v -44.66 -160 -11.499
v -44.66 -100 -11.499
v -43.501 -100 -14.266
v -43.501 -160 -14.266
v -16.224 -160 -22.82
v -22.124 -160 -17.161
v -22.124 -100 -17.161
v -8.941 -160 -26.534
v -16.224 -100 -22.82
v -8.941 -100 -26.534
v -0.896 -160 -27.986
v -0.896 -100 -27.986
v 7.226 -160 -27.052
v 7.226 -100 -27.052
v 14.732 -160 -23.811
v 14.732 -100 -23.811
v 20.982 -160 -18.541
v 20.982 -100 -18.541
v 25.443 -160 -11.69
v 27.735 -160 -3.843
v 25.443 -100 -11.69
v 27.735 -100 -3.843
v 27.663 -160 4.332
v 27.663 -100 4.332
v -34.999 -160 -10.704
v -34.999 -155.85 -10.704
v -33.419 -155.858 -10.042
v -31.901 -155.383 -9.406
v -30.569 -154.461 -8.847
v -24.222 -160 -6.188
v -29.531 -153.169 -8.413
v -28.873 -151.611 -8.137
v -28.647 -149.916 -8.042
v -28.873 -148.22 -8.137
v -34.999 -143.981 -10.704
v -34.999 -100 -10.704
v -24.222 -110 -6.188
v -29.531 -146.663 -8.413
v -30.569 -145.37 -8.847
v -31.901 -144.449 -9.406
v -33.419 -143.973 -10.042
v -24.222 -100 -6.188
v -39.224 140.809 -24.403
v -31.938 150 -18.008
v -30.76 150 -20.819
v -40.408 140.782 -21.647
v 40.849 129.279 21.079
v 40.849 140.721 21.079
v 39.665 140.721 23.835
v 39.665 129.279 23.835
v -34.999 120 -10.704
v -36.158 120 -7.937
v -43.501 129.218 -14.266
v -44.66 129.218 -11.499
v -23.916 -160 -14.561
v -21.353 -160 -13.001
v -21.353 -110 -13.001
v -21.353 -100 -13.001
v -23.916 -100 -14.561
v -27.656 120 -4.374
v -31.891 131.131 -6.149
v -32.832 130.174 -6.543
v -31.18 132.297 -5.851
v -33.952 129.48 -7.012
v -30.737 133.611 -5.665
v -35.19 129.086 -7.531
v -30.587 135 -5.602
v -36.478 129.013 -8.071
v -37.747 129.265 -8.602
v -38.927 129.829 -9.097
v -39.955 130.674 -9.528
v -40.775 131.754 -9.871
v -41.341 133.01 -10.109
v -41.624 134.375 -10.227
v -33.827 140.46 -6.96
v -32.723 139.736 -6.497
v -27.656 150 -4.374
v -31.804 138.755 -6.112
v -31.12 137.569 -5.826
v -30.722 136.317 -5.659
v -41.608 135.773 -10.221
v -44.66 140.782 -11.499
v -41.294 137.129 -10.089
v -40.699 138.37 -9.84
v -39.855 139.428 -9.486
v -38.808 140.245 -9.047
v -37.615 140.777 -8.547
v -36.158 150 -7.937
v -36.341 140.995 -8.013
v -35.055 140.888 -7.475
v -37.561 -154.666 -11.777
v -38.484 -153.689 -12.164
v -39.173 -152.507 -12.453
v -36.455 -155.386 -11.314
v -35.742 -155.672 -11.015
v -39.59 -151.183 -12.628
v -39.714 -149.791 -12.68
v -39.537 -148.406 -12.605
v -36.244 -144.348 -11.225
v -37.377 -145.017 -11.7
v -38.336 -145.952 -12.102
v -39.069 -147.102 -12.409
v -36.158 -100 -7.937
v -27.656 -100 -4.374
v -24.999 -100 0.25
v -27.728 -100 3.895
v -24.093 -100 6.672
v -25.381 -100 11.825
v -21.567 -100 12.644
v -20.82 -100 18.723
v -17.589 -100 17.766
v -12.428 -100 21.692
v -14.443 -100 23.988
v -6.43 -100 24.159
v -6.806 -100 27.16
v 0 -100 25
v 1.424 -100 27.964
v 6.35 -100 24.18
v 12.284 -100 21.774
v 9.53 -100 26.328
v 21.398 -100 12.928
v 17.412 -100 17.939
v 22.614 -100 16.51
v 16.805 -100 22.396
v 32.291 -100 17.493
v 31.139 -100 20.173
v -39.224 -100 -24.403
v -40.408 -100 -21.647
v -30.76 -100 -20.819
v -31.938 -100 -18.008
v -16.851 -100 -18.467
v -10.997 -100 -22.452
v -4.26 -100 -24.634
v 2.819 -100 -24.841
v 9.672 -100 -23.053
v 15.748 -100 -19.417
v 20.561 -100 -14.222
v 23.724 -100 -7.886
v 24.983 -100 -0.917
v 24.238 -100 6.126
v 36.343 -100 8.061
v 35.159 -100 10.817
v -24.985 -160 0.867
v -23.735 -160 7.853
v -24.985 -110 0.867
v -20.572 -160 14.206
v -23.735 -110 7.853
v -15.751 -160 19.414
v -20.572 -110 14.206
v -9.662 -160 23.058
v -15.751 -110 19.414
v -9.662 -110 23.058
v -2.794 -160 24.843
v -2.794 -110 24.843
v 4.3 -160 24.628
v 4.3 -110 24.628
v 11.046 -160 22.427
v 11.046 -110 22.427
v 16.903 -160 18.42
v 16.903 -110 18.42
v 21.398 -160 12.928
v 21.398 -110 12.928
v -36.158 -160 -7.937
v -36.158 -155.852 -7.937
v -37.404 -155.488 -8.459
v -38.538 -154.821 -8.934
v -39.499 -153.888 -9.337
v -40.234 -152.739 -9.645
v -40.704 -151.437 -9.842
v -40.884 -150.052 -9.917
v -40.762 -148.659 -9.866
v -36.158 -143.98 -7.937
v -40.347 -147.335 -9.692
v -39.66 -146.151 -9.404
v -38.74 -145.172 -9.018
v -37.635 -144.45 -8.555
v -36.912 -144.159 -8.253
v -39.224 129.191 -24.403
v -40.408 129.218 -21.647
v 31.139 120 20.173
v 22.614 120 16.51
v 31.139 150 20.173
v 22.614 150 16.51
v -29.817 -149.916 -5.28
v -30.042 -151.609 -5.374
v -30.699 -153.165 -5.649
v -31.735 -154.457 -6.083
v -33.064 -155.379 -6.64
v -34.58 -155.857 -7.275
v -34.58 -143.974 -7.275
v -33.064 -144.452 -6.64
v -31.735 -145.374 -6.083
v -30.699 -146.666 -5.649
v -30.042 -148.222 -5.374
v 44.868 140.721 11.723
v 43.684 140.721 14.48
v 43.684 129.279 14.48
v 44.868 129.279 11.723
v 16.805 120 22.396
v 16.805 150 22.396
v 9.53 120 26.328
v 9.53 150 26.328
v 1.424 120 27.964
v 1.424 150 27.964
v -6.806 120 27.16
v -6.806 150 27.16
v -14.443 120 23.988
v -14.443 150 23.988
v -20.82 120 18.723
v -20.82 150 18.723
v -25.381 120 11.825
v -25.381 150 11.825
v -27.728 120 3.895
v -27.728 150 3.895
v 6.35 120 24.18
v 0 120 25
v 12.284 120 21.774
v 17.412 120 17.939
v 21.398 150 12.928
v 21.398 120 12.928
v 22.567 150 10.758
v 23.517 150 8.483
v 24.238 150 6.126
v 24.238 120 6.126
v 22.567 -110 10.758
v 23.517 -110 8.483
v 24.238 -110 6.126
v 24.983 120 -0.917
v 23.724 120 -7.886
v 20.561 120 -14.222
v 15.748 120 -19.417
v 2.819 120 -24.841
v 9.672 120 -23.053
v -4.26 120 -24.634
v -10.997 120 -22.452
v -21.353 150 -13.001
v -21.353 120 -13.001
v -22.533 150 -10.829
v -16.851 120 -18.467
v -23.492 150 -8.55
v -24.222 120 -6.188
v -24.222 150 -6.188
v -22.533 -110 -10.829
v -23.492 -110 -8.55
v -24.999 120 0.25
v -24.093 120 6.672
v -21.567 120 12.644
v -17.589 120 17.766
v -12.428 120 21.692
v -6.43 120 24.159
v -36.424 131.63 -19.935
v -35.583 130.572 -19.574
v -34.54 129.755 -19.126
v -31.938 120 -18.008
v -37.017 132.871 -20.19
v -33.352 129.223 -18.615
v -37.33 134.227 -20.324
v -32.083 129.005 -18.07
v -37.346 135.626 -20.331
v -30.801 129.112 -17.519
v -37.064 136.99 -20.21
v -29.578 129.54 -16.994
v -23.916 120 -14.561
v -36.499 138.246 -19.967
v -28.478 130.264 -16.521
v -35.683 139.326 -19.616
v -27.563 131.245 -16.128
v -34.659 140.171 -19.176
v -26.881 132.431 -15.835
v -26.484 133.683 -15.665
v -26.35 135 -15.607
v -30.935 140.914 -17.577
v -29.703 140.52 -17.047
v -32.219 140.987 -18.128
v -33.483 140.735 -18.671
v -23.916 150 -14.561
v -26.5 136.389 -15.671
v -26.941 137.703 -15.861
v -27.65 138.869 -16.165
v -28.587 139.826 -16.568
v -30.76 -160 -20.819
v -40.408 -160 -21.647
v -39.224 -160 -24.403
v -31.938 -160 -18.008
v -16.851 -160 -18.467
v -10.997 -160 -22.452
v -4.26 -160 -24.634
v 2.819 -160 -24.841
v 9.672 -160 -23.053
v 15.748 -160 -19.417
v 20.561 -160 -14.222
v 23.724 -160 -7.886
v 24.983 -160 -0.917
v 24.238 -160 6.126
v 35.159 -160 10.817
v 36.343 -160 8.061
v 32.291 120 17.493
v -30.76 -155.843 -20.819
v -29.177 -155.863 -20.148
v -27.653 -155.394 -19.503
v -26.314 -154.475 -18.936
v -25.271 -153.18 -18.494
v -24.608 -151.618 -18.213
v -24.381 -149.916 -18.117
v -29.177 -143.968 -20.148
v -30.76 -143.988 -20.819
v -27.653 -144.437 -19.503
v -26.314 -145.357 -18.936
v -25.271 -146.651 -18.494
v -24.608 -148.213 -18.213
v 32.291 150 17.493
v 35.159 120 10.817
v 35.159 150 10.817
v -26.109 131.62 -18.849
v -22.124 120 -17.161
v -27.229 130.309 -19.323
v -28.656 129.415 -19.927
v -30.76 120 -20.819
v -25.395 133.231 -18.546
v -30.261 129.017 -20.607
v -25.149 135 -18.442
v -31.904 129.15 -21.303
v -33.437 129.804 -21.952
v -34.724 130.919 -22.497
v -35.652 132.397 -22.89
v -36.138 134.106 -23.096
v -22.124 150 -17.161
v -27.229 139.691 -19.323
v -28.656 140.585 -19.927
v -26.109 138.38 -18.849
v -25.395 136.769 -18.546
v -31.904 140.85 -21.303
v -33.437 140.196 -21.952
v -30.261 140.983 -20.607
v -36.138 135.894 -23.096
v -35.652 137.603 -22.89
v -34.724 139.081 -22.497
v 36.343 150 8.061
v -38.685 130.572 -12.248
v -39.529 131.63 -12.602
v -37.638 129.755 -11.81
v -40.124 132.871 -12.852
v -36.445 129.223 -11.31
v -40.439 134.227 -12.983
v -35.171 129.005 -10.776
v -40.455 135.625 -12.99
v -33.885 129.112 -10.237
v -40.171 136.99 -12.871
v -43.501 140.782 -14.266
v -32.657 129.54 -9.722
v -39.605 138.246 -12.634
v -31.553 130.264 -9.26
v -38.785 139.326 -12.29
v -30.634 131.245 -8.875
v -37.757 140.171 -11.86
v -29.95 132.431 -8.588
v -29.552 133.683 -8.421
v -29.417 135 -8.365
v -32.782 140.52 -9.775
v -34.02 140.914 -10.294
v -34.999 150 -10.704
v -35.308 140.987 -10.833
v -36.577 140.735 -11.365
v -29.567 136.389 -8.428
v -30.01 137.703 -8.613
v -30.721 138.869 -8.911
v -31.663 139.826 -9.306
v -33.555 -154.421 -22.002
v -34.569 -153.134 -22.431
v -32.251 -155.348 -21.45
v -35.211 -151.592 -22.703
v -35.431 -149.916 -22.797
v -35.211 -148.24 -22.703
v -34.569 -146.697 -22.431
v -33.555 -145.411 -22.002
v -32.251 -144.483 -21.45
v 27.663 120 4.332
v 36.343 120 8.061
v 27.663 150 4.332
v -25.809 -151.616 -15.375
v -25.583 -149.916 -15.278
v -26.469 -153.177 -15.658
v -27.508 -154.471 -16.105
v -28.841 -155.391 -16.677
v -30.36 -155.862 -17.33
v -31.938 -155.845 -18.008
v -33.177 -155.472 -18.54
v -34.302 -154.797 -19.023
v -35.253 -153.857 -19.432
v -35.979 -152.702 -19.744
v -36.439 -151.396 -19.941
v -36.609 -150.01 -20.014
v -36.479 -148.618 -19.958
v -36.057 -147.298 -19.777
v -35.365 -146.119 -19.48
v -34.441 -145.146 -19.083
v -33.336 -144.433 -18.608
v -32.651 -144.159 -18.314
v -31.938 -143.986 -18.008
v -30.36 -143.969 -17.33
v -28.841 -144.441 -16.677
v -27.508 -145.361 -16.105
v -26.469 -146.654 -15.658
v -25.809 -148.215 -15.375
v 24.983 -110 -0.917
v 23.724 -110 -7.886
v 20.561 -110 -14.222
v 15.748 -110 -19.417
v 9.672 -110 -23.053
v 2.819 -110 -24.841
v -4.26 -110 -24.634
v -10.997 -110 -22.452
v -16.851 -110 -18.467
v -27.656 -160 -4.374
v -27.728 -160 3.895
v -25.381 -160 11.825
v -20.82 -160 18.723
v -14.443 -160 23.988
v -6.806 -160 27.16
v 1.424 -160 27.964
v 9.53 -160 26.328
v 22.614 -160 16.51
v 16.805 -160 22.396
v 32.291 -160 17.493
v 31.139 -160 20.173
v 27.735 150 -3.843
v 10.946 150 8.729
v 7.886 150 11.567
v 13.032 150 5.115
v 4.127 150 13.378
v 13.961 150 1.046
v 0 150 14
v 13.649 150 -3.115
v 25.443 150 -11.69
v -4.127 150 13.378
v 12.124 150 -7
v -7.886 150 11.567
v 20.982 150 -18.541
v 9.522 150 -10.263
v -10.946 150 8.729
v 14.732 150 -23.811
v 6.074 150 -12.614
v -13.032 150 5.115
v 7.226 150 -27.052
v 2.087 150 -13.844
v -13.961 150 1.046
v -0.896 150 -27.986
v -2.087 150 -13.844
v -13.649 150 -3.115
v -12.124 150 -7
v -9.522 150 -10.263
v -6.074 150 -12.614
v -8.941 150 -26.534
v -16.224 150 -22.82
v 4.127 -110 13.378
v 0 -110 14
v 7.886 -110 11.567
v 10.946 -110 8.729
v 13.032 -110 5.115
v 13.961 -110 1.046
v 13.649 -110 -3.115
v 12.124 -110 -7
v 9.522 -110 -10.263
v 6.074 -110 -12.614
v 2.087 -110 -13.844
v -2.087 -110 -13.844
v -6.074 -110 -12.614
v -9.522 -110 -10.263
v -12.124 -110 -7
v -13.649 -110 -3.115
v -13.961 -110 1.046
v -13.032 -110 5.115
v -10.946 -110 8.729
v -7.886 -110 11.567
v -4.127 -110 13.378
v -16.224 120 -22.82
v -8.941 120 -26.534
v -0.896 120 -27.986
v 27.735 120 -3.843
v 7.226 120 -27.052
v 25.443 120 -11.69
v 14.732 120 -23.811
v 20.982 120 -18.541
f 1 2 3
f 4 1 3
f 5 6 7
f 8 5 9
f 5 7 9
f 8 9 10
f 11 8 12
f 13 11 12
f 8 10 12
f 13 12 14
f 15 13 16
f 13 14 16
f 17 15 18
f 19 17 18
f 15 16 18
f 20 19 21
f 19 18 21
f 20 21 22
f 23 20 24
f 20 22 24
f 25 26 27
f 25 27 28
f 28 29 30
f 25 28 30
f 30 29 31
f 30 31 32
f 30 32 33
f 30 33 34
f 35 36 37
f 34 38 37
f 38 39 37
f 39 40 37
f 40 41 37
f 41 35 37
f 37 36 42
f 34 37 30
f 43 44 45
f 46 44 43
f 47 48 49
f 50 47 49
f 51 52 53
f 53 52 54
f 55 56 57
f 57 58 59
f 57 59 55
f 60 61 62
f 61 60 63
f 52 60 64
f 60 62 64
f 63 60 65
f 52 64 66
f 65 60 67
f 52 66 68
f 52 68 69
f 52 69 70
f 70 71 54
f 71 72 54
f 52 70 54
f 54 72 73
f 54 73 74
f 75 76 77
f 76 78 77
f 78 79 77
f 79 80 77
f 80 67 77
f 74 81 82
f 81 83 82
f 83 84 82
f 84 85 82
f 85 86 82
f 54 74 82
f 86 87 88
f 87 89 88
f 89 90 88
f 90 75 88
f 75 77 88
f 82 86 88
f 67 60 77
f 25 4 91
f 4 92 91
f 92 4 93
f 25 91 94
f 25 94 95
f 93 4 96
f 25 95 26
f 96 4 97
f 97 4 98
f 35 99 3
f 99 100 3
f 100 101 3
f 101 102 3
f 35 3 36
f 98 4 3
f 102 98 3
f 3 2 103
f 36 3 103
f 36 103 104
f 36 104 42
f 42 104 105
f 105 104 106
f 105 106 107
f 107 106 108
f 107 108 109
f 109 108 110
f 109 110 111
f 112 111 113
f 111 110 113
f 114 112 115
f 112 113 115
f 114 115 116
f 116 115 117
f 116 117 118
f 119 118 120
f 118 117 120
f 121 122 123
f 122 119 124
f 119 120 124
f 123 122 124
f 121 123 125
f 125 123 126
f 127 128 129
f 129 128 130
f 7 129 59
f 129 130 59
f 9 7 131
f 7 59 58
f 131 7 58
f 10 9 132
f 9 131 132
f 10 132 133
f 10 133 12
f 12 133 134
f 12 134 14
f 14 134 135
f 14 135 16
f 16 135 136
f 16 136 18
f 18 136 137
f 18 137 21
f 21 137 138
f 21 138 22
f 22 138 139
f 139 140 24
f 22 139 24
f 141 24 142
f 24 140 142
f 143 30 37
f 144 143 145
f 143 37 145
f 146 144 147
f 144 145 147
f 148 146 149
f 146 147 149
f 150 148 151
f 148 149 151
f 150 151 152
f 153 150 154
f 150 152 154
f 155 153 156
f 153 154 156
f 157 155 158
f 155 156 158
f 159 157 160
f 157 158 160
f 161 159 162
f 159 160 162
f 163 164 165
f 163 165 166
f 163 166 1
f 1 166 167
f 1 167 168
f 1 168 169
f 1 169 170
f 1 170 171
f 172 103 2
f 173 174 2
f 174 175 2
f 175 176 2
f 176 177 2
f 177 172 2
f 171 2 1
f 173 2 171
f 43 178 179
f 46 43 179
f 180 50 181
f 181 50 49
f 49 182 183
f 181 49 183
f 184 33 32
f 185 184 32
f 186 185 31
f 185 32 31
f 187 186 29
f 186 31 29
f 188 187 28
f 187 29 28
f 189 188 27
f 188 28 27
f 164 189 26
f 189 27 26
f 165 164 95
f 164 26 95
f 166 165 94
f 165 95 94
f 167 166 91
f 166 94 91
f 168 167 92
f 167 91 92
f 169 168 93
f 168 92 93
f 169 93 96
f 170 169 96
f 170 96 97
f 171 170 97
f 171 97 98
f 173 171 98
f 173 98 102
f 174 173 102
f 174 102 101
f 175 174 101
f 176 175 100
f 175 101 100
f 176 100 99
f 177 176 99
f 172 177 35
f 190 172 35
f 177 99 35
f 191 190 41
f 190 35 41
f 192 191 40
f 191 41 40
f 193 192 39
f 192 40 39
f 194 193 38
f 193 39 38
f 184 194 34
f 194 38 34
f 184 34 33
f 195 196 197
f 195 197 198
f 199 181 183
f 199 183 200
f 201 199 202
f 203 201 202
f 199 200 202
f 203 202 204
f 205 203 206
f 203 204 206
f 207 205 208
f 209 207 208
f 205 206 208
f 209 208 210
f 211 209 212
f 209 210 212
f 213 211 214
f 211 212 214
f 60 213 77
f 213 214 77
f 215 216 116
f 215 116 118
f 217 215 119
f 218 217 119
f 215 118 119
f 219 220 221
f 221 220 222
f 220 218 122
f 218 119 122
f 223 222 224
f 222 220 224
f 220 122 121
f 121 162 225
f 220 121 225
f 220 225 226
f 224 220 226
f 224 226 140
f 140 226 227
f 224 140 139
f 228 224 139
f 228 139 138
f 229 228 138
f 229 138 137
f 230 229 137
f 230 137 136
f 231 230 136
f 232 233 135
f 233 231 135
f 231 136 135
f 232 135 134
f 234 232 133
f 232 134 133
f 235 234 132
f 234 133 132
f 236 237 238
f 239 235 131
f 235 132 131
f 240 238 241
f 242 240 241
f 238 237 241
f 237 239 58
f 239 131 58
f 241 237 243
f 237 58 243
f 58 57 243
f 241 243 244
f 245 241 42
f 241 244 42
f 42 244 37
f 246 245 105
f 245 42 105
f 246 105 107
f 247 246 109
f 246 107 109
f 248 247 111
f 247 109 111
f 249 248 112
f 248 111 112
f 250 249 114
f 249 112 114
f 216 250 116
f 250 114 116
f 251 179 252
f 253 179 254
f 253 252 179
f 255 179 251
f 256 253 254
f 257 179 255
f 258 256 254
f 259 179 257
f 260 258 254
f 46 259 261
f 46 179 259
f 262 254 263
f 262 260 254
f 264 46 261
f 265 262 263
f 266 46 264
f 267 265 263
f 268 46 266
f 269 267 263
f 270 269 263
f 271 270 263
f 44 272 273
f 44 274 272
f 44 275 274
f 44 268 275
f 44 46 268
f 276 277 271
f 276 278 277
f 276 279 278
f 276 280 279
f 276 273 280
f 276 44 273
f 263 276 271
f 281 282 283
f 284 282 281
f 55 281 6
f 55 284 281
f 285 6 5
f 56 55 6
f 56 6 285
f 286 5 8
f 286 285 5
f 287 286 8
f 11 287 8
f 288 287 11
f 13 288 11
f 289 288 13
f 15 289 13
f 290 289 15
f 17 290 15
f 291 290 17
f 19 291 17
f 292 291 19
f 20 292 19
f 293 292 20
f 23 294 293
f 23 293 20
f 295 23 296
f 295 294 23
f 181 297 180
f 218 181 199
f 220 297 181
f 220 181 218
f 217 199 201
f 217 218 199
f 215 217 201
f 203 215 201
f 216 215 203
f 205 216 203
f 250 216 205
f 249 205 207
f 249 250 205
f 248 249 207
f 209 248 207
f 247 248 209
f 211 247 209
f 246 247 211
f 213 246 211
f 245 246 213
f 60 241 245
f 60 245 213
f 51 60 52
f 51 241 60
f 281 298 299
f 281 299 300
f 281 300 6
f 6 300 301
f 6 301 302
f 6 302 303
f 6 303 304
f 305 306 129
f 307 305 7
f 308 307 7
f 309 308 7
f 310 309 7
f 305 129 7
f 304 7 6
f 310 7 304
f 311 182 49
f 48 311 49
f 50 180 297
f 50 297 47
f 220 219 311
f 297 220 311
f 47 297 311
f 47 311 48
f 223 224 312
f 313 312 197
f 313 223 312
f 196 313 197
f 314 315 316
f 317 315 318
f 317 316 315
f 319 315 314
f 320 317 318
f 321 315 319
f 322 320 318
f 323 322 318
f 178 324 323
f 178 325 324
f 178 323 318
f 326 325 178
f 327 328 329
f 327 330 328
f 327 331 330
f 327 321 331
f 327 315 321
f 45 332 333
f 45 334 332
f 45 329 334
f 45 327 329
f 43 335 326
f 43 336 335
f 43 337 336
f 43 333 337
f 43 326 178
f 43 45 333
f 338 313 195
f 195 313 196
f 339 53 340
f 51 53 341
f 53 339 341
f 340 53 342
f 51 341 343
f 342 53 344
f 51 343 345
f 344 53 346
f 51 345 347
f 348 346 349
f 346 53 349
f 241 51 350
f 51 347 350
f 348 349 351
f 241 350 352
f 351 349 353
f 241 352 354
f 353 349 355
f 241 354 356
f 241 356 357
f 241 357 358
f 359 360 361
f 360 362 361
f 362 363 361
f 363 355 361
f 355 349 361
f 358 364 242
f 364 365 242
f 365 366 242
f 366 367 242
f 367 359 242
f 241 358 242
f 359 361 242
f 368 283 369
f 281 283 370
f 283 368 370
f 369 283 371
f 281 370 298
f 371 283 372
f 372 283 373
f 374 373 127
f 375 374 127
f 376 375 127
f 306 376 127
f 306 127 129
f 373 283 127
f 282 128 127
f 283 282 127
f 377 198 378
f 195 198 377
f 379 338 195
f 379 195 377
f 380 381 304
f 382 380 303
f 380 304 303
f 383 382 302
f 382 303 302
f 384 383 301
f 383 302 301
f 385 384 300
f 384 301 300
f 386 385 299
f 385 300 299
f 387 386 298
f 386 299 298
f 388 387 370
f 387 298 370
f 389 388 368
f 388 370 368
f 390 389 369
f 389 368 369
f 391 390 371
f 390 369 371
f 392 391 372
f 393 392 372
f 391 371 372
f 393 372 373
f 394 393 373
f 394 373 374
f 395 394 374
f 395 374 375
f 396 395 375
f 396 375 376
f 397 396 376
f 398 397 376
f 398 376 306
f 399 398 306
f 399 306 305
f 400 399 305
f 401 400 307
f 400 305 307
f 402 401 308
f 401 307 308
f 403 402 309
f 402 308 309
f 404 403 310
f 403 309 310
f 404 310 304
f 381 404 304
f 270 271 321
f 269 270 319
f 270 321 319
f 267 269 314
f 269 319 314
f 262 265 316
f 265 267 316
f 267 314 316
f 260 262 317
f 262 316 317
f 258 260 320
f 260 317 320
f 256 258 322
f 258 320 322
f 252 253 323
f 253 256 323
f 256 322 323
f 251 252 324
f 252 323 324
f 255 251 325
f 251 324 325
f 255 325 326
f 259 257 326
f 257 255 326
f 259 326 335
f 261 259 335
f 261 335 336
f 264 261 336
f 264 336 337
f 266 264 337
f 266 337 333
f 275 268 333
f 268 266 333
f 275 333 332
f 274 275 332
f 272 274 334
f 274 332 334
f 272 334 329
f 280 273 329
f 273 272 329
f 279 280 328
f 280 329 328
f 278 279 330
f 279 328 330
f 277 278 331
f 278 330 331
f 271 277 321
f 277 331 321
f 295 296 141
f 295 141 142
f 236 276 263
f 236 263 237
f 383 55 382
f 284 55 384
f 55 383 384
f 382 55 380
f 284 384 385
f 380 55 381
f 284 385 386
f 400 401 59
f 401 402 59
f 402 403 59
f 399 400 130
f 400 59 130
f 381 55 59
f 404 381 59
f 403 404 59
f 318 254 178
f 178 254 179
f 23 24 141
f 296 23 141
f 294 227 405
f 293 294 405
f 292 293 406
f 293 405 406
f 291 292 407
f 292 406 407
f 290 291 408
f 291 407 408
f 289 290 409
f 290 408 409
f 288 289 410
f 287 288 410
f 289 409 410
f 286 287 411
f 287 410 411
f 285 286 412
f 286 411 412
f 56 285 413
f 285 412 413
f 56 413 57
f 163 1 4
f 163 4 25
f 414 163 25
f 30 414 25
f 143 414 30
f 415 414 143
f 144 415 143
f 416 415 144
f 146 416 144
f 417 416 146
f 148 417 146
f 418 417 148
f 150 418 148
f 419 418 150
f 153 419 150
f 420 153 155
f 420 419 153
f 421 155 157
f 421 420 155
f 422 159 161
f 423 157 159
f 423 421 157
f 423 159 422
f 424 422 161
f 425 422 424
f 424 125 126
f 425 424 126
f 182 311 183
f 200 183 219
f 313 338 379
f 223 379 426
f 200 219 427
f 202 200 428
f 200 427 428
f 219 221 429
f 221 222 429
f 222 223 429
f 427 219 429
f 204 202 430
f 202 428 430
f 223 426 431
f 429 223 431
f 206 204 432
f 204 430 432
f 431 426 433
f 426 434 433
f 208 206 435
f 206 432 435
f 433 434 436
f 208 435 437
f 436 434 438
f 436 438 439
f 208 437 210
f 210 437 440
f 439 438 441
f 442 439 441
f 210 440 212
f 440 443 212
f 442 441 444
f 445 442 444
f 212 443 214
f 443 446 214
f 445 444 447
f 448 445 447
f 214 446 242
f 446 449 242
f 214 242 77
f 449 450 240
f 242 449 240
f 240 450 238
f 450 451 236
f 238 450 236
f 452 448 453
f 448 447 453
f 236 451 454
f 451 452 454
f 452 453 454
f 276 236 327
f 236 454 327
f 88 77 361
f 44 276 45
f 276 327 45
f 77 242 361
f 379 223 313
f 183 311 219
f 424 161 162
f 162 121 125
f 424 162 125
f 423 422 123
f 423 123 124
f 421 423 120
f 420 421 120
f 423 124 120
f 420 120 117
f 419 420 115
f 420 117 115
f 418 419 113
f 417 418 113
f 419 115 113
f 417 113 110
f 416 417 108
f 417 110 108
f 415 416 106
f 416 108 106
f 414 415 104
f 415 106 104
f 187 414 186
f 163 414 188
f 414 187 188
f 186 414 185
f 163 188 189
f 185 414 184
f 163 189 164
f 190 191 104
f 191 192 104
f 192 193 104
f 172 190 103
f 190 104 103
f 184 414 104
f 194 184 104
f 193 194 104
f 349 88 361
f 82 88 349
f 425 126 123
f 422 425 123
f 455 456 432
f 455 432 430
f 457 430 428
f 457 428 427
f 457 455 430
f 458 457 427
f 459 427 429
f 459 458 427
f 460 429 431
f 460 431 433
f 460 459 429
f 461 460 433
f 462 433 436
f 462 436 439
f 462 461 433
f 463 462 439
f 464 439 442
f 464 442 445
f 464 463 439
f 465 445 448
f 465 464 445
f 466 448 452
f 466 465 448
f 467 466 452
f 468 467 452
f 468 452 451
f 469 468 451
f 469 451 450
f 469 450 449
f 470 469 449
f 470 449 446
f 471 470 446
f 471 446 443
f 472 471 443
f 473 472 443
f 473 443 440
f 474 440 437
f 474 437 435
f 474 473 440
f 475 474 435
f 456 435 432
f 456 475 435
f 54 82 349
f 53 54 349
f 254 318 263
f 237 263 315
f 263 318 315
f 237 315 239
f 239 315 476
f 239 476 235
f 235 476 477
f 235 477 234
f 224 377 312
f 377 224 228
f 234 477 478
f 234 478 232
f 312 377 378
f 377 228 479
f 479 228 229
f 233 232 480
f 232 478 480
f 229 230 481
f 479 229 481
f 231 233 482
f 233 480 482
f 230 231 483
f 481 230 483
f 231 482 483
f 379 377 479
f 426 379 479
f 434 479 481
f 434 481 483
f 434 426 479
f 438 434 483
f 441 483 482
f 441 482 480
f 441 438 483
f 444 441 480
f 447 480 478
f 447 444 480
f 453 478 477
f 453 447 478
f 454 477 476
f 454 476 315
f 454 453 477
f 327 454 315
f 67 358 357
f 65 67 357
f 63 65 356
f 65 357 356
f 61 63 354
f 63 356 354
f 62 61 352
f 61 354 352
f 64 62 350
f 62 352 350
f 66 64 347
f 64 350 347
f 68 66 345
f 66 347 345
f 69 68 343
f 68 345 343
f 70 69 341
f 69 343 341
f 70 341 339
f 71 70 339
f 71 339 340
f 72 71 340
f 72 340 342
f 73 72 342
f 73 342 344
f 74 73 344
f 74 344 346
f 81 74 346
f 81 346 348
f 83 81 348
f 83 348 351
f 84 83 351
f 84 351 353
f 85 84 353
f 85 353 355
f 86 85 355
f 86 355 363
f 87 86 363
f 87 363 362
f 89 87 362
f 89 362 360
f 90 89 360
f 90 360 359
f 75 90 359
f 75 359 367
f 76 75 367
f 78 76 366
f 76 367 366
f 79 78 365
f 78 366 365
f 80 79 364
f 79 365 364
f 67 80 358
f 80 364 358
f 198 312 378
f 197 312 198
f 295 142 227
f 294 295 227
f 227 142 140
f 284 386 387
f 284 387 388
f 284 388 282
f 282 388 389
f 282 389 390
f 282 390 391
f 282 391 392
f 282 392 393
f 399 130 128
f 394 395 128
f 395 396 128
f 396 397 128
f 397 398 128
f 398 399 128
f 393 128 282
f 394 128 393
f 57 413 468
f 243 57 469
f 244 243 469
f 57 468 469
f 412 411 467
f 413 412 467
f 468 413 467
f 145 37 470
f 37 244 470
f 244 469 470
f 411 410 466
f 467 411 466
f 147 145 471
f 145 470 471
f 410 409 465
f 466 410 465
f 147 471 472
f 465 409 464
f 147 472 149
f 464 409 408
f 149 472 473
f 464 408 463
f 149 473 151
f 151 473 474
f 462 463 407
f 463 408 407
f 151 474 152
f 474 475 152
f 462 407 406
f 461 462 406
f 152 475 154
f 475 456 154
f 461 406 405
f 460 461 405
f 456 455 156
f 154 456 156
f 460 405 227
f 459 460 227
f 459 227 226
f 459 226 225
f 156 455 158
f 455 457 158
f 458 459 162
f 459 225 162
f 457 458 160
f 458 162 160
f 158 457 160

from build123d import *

# Parameters (mm, degrees)
BOSS_EXTRUDE1_DEPTH      = 150
BOSS_EXTRUDE1_DEPTH_BACK = 110
SKETCH1_R                = 25
SKETCH1_R_2              = 14
BOSS_EXTRUDE2_DEPTH      = 30
SKETCH4_R                = 6
CUT_EXTRUDE1_DEPTH       = 30
CUT_EXTRUDE3_DEPTH       = 30
CUT_EXTRUDE4_DEPTH       = 30
BOSS_EXTRUDE3_DEPTH      = 50
BOSS_EXTRUDE3_DEPTH_BACK = 10
SKETCH10_R               = 6
CUT_EXTRUDE5_DEPTH       = 20


with BuildPart() as part:
    # Sketch1 → Boss-Extrude1 (new, two sides: drawn at the far end of the back side and taken through both)
    with BuildSketch(Plane(origin=(0, 0, 0), x_dir=(1, 0, 0), z_dir=(0, 1, 0)).offset(-BOSS_EXTRUDE1_DEPTH_BACK)):
        with Locations(Location((0, 0, 0), (0, 0, 270))):
            Circle(SKETCH1_R)
        with Locations(Location((0, 0, 0), (0, 0, 270))):
            Circle(SKETCH1_R_2, mode=Mode.SUBTRACT)
    extrude(amount=BOSS_EXTRUDE1_DEPTH + BOSS_EXTRUDE1_DEPTH_BACK)

    # Sketch2 → Boss-Extrude2 (add)
    with BuildSketch(Plane(origin=(0, 150, 0), x_dir=(1, 0, 0), z_dir=(0, 1, 0))):
        with BuildLine():
            Line((-23.915836384, 14.561345064), (-21.353425342, 13.00120095))
            ThreePointArc((-21.353425342, 13.00120095), (9.671523715, 23.053451564), (24.237934753, -6.125562743))
            Line((24.237934753, -6.125562743), (43.683817295, -14.479533157))
            Line((43.683817295, -14.479533157), (44.867972274, -11.723126622))
            Line((44.867972274, -11.723126622), (27.66288952, -4.331806018))
            ThreePointArc((27.66288952, -4.331806018), (11.097692173, 25.70683233), (-22.124313852, 17.161431659))
            Line((-22.124313852, 17.161431659), (-39.224178944, 24.402944888))
            Line((-39.224178944, 24.402944888), (-40.408333923, 21.646538353))
            Line((-40.408333923, 21.646538353), (-23.915836384, 14.561345064))
        make_face()
        with BuildLine():
            Line((-43.500856668, 14.266360747), (-24.222080563, 6.187957111))
            ThreePointArc((-24.222080563, 6.187957111), (-9.661815141, -23.057522161), (21.397729285, -12.928154604))
            Line((21.397729285, -12.928154604), (40.848787327, -21.078749702))
            Line((40.848787327, -21.078749702), (39.664632347, -23.835156237))
            Line((39.664632347, -23.835156237), (22.614348516, -16.510337404))
            ThreePointArc((22.614348516, -16.510337404), (-10.742271175, -25.857370516), (-27.656212868, 4.374230197))
            Line((-27.656212868, 4.374230197), (-44.660274485, 11.499458088))
            Line((-44.660274485, 11.499458088), (-43.500856668, 14.266360747))
        make_face()
    extrude(amount=-BOSS_EXTRUDE2_DEPTH)

    # Sketch4 → Cut-Extrude1 (cut)
    with BuildSketch(Plane(origin=(2.798049006, 0, -6.607218549), x_dir=(-0.9208327997677669, 0, -0.38995763214977075), z_dir=(0.3899576321497707, 0, -0.9208327997677668))):
        with Locations(Location((36.350025121, 135, 0), (0, 0, 180))):
            Circle(SKETCH4_R)
    extrude(amount=-CUT_EXTRUDE1_DEPTH, mode=Mode.SUBTRACT)

    # Sketch6 → Cut-Extrude3 (cut)
    with BuildSketch(Plane(origin=(-2.464398676, 0, 5.736482753), x_dir=(0.9188021782605189, 0, 0.39471832643509935), z_dir=(-0.39471832643509935, 0, 0.9188021782605189))):
        Polygon((36.573584503, 150), (45.852123581, 140.721460922), (66.07138883, 154.845920949), align=None)
        Polygon((36.573584503, 120), (62.874627202, 146.301042699), (73.132170225, 136.043499677), (73.132170225, 101.712575759), align=None)
    extrude(amount=-CUT_EXTRUDE3_DEPTH, mode=Mode.SUBTRACT)

    # Sketch7 → Cut-Extrude4 (cut)
    with BuildSketch(Plane(origin=(-2.571593456, 0, 6.137001406), x_dir=(0.9223008864267629, 0, 0.3864726056221933), z_dir=(-0.3864726056221933, 0, 0.9223008864267629))):
        Polygon((-36.416153031, 150), (-45.634436276, 140.781716754), (-52.238797728, 153.982696948), (-36.416153031, 153.982696948), align=None)
        Polygon((-36.416153031, 120), (-66.089359291, 149.67320626), (-66.089359291, 112.136229403), align=None)
    extrude(amount=-CUT_EXTRUDE4_DEPTH, mode=Mode.SUBTRACT)

    # Sketch8 → Boss-Extrude3 (add, two sides: drawn at the far end of the back side and taken through both)
    with BuildSketch(Plane.XZ.offset(110).offset(-BOSS_EXTRUDE3_DEPTH_BACK)):
        with BuildLine():
            Line((-23.915836384, -14.561345064), (-31.938215406, -18.007767043))
            Line((-31.938215406, -18.007767043), (-40.408333923, -21.646538353))
            Line((-40.408333923, -21.646538353), (-39.224178944, -24.402944888))
            Line((-39.224178944, -24.402944888), (-30.760365079, -20.818658126))
            Line((-30.760365079, -20.818658126), (-22.124313852, -17.161431659))
            ThreePointArc((-22.124313852, -17.161431659), (11.097692173, -25.70683233), (27.66288952, 4.331806018))
            Line((27.66288952, 4.331806018), (36.342830359, 8.060717205))
            Line((36.342830359, 8.060717205), (35.15867538, 10.81712374))
            Line((35.15867538, 10.81712374), (24.237934753, 6.125562743))
            ThreePointArc((24.237934753, 6.125562743), (9.671523715, -23.053451564), (-21.353425342, -13.00120095))
            Line((-21.353425342, -13.00120095), (-23.915836384, -14.561345064))
        make_face()
        with BuildLine():
            Line((-27.656212868, -4.374230197), (-36.158243676, -7.936844143))
            Line((-36.158243676, -7.936844143), (-44.660274485, -11.499458088))
            Line((-44.660274485, -11.499458088), (-43.500856668, -14.266360747))
            Line((-43.500856668, -14.266360747), (-34.998825859, -10.703746802))
            Line((-34.998825859, -10.703746802), (-24.222080563, -6.187957111))
            ThreePointArc((-24.222080563, -6.187957111), (-9.661815141, 23.057522161), (21.397729285, 12.928154604))
            Line((21.397729285, 12.928154604), (32.290839196, 17.492704669))
            Line((32.290839196, 17.492704669), (31.139490432, 20.17274682))
            Line((31.139490432, 20.17274682), (22.614348516, 16.510337404))
            ThreePointArc((22.614348516, 16.510337404), (-10.742271175, 25.857370516), (-27.656212868, -4.374230197))
        make_face()
    extrude(amount=BOSS_EXTRUDE3_DEPTH + BOSS_EXTRUDE3_DEPTH_BACK)

    # Sketch10 → Cut-Extrude5 (cut)
    with BuildSketch(Plane(origin=(2.798049006, 0, -6.607218549), x_dir=(-0.9208327997677666, 0, -0.3899576321497714), z_dir=(0.3899576321497714, 0, -0.9208327997677666))):
        with Locations(Location((35.51571532, -149.915667196, 0), (0, 0, 180))):
            Circle(SKETCH10_R)
    extrude(amount=-CUT_EXTRUDE5_DEPTH, mode=Mode.SUBTRACT)


solid = part.part
